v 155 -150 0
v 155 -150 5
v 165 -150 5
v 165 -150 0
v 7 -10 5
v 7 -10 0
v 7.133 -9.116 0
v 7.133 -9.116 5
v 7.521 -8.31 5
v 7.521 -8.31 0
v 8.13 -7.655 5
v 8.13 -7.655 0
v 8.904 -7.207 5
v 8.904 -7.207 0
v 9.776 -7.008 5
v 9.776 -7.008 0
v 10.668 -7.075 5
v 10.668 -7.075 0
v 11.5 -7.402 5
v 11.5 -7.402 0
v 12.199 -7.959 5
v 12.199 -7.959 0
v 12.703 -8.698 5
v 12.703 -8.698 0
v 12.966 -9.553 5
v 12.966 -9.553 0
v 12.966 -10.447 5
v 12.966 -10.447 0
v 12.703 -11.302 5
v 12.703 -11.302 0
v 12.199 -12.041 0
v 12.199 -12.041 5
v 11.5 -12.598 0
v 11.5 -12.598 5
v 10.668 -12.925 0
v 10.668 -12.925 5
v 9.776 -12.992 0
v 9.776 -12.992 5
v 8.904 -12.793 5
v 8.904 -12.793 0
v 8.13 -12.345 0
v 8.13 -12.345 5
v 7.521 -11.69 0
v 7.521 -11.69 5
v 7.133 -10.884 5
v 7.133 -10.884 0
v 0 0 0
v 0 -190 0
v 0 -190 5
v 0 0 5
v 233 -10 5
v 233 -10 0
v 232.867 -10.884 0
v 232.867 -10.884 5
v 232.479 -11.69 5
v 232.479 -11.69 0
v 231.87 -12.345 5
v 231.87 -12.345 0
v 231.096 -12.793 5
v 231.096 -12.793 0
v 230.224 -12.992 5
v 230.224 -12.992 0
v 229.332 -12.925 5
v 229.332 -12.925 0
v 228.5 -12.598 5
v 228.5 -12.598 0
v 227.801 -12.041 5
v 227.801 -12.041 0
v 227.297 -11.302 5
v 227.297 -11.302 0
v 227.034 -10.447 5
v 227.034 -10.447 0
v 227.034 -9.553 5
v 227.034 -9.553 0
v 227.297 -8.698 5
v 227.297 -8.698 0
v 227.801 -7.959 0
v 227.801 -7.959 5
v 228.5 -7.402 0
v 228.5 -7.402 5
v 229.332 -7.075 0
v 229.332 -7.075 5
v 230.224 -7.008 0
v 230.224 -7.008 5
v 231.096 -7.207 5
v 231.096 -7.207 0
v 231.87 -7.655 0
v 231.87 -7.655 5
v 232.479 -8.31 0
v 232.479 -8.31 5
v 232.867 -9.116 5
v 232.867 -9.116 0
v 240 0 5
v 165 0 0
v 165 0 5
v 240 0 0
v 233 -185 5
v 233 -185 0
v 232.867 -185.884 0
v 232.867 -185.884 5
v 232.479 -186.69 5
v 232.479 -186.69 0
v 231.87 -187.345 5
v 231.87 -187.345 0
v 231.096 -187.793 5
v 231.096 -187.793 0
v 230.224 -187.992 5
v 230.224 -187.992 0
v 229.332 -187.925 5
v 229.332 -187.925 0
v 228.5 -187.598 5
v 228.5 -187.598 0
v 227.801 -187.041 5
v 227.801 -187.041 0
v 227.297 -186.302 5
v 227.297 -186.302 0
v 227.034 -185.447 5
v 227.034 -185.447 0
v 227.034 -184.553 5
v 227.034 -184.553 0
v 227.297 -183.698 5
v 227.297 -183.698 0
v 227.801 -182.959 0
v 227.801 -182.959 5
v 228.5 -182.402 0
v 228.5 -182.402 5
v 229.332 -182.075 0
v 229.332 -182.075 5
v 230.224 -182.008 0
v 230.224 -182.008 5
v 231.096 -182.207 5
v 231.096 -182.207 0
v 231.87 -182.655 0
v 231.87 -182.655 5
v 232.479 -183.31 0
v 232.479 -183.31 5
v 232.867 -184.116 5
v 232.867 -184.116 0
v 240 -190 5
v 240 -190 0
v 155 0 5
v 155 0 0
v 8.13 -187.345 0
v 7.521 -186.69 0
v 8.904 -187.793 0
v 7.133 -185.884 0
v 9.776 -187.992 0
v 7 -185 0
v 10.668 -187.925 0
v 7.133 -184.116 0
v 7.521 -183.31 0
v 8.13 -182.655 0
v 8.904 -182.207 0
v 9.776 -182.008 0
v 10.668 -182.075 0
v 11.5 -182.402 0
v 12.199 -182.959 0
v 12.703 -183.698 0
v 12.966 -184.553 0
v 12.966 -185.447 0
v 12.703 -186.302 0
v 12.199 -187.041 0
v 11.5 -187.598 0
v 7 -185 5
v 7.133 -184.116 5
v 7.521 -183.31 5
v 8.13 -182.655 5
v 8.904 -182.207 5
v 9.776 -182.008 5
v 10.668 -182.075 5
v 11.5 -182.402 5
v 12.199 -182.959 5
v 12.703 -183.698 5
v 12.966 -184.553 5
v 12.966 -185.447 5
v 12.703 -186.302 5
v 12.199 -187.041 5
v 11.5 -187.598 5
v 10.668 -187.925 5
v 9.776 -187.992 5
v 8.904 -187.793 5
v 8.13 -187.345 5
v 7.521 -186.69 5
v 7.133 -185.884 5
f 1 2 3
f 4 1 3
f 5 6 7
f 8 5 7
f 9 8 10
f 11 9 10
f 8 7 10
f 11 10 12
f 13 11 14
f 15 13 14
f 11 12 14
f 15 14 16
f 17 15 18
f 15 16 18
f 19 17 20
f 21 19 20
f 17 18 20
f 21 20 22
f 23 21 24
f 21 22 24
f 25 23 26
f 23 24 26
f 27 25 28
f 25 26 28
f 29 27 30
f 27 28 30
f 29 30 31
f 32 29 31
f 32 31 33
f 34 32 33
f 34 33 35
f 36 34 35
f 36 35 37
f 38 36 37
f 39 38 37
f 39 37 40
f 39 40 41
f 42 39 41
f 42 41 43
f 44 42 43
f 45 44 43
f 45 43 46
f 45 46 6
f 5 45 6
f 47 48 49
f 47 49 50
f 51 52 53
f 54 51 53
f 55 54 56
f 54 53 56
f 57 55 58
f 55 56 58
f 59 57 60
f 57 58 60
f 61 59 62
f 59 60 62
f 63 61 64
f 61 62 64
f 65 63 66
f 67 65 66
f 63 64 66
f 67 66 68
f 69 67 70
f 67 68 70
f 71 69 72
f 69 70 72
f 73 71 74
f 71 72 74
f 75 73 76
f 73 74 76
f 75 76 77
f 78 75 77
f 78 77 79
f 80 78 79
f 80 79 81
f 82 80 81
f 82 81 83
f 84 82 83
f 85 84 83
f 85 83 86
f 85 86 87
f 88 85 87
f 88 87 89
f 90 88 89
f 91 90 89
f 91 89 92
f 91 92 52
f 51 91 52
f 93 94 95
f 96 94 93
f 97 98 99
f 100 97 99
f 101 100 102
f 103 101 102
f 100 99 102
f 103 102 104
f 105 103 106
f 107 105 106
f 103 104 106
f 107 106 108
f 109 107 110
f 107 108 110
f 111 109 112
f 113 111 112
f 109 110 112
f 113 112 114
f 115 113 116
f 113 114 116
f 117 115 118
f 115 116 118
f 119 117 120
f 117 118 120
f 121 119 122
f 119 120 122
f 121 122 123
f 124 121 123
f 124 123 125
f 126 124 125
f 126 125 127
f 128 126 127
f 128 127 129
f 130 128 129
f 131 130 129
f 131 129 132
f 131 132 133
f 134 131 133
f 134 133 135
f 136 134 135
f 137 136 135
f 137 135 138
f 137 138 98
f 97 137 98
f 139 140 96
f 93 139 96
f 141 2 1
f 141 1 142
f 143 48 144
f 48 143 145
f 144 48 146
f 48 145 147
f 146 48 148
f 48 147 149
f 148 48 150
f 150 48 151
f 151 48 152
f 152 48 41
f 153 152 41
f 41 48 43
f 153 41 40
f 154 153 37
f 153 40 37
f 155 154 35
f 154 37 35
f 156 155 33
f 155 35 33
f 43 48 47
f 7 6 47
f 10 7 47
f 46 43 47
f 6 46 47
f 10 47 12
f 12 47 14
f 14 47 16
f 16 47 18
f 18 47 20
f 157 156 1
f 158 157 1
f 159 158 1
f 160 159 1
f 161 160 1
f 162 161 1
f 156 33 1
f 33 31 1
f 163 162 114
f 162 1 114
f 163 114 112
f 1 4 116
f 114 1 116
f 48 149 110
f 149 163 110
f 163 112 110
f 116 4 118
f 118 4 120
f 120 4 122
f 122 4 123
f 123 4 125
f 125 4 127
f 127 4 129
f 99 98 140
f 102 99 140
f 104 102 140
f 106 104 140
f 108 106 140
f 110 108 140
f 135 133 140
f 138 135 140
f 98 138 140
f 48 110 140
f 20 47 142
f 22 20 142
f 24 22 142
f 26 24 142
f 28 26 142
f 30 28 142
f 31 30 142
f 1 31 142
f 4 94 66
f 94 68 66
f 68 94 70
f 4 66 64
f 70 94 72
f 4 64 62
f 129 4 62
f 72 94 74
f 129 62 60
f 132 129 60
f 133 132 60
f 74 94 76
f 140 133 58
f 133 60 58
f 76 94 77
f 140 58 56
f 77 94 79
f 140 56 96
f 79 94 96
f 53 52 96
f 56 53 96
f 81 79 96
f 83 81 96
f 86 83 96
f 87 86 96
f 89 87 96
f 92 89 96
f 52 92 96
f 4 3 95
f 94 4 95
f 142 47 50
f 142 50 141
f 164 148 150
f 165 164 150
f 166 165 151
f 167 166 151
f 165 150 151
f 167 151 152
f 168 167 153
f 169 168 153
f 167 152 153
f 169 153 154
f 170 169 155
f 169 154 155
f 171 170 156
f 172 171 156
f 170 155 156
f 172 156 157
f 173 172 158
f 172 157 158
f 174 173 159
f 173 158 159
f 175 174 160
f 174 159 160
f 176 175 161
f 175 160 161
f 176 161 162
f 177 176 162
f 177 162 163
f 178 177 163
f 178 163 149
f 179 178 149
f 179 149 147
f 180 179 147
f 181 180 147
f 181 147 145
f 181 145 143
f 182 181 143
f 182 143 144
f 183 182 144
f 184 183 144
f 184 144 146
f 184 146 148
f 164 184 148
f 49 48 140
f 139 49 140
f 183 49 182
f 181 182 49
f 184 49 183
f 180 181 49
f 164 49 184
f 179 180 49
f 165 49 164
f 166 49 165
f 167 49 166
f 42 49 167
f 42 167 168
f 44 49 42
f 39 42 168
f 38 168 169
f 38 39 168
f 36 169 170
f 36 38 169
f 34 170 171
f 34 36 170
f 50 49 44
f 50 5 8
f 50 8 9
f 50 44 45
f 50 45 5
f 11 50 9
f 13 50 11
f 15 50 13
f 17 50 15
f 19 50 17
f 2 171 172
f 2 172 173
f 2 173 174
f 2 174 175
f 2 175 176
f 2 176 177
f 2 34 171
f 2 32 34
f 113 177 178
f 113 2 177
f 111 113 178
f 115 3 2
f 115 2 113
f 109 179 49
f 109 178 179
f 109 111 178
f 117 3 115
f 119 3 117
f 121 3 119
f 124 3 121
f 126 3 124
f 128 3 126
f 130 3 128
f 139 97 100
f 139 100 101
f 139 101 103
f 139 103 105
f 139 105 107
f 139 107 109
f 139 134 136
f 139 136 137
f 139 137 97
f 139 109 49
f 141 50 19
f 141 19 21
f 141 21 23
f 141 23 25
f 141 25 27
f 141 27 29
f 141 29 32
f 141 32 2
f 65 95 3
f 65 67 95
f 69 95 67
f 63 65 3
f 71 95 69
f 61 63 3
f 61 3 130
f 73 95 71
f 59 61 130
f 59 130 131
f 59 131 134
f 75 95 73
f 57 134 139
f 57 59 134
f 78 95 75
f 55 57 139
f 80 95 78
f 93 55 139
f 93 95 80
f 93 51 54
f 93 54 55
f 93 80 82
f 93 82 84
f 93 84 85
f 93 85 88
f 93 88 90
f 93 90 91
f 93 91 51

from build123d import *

# Parameters (mm, degrees)
ESQUISSE1_W             = 240
ESQUISSE1_H             = 190
BOSS_EXTRU_1_DEPTH      = 5
ESQUISSE2_W             = 10
ESQUISSE2_H             = 150
ENL_V_MAT_EXTRU_1_DEPTH = 5
ESQUISSE3_R             = 3
ENL_V_MAT_EXTRU_2_DEPTH = 10


with BuildPart() as part:
    # Esquisse1 → Boss.-Extru.1 (new body)
    with BuildSketch(Plane.XY):
        with Locations((120, -95)):
            Rectangle(ESQUISSE1_W, ESQUISSE1_H)
    extrude(amount=BOSS_EXTRU_1_DEPTH)

    # Esquisse2 → Enlèv. mat.-Extru.1 (cut)
    with BuildSketch(Plane.XY.offset(5)):
        with Locations((160, -75)):
            Rectangle(ESQUISSE2_W, ESQUISSE2_H)
    extrude(amount=-ENL_V_MAT_EXTRU_1_DEPTH, mode=Mode.SUBTRACT)

    # Esquisse3 → Enlèv. mat.-Extru.2 (cut)
    with BuildSketch(Plane(origin=(0, 0, 0), x_dir=(-1, 0, 0), z_dir=(0, 0, -1))):
        with Locations((-10, -185)):
            Circle(ESQUISSE3_R)
        with Locations((-10, -10)):
            Circle(ESQUISSE3_R)
        with Locations(Location((-230, -185, 0), (0, 0, 180))):
            Circle(ESQUISSE3_R)
        with Locations(Location((-230, -10, 0), (0, 0, 180))):
            Circle(ESQUISSE3_R)
    extrude(amount=-ENL_V_MAT_EXTRU_2_DEPTH, mode=Mode.SUBTRACT)


solid = part.part
